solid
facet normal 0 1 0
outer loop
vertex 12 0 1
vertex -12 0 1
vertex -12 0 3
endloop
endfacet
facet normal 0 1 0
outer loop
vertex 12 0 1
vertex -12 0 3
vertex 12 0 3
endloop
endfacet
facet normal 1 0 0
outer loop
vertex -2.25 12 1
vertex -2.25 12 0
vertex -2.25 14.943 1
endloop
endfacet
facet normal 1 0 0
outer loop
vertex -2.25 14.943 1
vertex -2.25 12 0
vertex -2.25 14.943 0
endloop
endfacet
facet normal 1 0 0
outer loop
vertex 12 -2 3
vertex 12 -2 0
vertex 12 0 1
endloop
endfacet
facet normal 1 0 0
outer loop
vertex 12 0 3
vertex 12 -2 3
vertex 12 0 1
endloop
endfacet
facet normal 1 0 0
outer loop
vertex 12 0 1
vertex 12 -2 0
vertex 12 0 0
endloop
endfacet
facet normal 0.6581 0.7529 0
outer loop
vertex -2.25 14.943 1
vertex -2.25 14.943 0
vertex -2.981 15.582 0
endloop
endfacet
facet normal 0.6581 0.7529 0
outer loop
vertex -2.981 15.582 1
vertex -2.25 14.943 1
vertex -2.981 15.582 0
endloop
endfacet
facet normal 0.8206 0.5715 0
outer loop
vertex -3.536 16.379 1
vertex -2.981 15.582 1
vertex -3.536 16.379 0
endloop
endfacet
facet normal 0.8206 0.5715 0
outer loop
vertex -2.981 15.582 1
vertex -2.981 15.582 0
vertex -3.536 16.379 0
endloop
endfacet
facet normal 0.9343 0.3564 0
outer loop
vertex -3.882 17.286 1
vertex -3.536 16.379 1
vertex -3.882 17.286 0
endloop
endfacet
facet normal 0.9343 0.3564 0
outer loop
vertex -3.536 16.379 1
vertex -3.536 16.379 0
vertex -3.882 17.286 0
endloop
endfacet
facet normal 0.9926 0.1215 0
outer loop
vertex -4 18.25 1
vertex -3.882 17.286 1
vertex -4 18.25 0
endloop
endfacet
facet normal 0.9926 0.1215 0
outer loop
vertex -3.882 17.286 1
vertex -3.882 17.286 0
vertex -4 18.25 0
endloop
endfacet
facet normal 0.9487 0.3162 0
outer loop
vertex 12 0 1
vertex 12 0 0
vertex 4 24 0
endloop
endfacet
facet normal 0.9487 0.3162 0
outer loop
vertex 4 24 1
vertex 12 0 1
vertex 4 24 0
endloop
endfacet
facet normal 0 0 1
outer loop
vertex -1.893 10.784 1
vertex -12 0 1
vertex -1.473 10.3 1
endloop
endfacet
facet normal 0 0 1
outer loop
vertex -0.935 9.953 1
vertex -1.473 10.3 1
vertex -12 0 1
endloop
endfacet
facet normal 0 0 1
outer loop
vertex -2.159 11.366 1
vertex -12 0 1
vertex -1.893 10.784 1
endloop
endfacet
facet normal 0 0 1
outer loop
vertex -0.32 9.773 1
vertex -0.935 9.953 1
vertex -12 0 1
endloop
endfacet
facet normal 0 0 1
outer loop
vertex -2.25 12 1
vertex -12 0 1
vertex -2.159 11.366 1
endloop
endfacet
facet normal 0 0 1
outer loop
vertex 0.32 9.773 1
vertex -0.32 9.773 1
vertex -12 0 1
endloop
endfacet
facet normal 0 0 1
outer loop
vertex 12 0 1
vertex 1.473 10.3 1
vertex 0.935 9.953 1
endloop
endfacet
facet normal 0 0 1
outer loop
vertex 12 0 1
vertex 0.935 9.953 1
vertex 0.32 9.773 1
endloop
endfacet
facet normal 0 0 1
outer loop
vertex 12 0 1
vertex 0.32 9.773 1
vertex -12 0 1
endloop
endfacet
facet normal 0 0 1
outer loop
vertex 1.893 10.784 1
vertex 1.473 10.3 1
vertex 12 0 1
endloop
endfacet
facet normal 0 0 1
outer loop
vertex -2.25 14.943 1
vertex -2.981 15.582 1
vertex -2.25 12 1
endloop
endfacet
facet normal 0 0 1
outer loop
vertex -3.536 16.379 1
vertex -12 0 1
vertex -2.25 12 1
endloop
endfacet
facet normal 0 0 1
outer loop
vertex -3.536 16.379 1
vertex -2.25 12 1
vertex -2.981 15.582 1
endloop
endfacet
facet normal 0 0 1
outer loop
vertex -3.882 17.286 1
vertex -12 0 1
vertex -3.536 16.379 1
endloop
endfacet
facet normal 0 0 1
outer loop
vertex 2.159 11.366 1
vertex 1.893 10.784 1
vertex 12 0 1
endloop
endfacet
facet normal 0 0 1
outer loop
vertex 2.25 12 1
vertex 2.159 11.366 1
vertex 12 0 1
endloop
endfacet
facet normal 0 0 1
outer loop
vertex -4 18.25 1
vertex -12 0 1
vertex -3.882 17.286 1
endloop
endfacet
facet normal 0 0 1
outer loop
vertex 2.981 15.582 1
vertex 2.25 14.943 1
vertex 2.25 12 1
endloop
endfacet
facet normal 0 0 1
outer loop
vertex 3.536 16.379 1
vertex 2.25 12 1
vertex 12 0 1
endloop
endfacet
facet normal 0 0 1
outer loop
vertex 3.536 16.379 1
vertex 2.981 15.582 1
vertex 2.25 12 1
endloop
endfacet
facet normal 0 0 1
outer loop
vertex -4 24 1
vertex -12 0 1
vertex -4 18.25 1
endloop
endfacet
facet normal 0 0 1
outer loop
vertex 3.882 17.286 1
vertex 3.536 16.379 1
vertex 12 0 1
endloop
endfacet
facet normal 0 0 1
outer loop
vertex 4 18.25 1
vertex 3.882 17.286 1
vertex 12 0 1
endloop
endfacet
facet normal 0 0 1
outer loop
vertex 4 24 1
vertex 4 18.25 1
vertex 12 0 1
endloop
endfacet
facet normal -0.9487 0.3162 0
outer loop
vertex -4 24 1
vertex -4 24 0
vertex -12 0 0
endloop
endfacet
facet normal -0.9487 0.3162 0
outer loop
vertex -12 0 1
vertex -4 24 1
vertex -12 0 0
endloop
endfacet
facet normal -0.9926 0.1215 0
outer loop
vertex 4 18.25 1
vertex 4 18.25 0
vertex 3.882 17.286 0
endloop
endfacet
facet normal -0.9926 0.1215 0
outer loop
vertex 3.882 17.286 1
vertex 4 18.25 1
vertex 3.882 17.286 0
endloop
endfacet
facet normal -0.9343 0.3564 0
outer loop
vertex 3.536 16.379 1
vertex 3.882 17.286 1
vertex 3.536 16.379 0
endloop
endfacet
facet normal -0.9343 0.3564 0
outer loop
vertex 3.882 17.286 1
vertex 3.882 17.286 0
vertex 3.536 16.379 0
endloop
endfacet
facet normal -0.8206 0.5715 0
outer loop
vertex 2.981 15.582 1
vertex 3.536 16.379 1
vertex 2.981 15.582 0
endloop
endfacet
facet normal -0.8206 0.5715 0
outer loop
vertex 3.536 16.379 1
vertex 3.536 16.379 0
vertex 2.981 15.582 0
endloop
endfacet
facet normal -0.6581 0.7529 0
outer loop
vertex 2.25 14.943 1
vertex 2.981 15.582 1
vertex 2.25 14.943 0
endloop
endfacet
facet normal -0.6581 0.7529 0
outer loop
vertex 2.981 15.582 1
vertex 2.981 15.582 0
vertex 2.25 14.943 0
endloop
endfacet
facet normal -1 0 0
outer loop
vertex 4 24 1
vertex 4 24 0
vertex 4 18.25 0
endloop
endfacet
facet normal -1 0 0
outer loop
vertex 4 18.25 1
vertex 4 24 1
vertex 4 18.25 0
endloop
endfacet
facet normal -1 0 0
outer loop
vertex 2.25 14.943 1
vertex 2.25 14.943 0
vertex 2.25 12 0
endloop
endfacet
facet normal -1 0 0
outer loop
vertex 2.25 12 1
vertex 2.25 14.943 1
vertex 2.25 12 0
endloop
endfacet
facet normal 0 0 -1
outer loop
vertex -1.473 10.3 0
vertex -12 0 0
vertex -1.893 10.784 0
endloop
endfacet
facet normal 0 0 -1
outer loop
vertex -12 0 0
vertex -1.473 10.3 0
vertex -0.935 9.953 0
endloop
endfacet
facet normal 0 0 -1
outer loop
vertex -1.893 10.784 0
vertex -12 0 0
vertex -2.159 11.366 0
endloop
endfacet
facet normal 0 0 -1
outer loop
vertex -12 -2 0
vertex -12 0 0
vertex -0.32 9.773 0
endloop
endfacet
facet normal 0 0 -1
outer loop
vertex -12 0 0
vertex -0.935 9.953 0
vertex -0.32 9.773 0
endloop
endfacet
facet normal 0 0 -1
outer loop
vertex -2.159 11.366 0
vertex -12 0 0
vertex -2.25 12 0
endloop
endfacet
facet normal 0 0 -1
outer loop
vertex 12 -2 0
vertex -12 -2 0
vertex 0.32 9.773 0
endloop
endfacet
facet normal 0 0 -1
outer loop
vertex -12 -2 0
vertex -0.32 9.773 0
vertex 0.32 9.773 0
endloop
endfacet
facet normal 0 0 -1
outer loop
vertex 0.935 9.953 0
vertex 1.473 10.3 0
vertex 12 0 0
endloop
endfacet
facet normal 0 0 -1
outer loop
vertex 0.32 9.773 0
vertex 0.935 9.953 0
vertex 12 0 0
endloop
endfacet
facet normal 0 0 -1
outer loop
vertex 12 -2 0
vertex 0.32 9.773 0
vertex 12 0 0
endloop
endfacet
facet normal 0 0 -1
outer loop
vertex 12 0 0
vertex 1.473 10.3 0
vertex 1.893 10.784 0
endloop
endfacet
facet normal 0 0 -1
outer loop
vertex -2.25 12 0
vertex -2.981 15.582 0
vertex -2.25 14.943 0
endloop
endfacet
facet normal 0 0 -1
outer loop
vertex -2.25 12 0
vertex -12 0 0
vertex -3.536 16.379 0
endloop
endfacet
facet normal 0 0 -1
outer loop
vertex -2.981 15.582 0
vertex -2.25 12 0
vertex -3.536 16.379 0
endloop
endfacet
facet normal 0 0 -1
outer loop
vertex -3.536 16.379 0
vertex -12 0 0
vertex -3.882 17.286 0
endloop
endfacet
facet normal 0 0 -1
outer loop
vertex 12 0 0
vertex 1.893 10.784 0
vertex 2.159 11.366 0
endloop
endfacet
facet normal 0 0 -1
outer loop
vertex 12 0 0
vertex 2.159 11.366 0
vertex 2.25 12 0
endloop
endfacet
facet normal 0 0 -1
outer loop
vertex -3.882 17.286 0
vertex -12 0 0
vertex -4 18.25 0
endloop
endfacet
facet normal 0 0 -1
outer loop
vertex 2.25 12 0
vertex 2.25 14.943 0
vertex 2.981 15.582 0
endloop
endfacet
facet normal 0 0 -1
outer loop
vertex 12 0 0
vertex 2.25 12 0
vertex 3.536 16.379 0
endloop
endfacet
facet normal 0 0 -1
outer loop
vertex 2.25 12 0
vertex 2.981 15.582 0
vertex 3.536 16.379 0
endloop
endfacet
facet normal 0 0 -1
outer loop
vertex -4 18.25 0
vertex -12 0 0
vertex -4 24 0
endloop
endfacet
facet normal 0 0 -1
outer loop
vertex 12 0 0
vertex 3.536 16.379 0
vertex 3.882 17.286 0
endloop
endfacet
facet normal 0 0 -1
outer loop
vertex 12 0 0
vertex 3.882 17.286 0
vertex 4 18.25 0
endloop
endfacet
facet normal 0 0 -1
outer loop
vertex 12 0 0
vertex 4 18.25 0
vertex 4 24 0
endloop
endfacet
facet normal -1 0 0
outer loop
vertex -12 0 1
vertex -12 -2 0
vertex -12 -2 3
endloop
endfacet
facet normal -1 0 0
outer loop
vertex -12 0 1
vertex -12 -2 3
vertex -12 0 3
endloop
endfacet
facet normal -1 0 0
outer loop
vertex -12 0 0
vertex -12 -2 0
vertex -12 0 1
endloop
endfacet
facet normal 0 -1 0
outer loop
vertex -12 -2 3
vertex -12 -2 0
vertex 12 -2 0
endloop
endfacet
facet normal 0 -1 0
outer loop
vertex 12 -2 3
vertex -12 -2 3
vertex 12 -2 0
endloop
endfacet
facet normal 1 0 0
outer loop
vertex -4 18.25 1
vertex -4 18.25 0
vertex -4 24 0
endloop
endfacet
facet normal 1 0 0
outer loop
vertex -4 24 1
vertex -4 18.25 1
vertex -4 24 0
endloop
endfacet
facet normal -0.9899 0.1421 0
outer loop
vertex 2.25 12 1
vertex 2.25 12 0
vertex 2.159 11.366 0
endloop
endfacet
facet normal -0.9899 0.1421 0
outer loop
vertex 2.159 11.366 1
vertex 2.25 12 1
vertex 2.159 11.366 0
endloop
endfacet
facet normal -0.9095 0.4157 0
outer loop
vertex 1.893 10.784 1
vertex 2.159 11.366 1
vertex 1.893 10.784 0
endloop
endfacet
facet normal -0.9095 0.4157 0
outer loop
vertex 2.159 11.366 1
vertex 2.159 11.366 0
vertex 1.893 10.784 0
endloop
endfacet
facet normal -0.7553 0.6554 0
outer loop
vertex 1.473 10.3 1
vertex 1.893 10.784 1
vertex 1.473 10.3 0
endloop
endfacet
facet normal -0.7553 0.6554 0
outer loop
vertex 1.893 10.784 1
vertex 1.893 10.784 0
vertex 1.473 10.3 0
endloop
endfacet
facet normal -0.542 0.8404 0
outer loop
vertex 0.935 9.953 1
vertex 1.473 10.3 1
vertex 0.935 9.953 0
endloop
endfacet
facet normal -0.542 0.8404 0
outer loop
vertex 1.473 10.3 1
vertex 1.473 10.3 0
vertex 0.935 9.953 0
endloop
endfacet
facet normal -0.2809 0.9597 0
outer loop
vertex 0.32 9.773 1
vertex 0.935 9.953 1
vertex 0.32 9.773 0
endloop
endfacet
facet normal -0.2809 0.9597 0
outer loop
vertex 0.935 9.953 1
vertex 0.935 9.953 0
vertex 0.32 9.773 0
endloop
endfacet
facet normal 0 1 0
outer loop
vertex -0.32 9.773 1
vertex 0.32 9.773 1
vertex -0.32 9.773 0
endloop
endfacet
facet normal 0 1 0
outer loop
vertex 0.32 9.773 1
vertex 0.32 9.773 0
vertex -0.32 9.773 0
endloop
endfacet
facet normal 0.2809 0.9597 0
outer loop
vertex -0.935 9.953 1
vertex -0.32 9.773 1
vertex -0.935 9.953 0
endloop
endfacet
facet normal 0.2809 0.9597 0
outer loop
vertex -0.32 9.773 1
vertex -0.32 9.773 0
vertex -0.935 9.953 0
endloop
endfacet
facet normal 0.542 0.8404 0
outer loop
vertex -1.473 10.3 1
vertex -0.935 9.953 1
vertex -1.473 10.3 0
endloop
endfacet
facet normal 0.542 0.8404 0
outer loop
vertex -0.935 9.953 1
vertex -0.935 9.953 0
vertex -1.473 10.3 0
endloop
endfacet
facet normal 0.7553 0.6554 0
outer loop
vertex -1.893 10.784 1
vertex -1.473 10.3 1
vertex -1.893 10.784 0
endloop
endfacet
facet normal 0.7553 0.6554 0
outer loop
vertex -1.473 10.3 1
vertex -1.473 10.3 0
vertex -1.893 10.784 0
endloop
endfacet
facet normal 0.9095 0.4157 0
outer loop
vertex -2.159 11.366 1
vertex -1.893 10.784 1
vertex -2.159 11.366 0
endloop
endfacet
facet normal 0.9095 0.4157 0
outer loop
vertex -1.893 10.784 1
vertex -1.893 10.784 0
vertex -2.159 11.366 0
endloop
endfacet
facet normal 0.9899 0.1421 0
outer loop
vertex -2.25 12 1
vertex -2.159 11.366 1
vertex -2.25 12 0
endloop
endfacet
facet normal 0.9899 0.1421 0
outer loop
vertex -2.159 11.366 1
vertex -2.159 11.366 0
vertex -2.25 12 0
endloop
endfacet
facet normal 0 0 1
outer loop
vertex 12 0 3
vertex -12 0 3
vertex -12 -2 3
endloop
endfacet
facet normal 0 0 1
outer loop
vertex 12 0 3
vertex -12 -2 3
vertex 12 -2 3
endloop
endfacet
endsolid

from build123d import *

# Parameters (mm, degrees)
F1_DEPTH = 1
F0_W     = 24
F0_H     = 2
F2_DEPTH = 3


with BuildPart() as f1:
    # F0 (on Top) → F1 (new body)
    with BuildSketch(Plane.XY):
        with BuildLine():
            Line((-12, 0), (12, 0))
            Line((12, 0), (4, 24))
            Line((4, 24), (4, 18.25))
            ThreePointArc((4, 18.25), (3.535534, 16.379171), (2.25, 14.942811))
            Line((2.25, 14.942811), (2.25, 12))
            ThreePointArc((2.25, 12), (0, 9.75), (-2.25, 12))
            Line((-2.25, 12), (-2.25, 14.942811))
            ThreePointArc((-2.25, 14.942811), (-3.535534, 16.379171), (-4, 18.25))
            Line((-4, 18.25), (-4, 24))
            Line((-4, 24), (-12, 0))
        make_face()
    extrude(amount=F1_DEPTH)

    # F0 (on Top) → F2 (join)
    with BuildSketch(Plane.XY):
        with Locations((0, -1)):
            Rectangle(F0_W, F0_H)
    extrude(amount=F2_DEPTH)


solid = f1.part
